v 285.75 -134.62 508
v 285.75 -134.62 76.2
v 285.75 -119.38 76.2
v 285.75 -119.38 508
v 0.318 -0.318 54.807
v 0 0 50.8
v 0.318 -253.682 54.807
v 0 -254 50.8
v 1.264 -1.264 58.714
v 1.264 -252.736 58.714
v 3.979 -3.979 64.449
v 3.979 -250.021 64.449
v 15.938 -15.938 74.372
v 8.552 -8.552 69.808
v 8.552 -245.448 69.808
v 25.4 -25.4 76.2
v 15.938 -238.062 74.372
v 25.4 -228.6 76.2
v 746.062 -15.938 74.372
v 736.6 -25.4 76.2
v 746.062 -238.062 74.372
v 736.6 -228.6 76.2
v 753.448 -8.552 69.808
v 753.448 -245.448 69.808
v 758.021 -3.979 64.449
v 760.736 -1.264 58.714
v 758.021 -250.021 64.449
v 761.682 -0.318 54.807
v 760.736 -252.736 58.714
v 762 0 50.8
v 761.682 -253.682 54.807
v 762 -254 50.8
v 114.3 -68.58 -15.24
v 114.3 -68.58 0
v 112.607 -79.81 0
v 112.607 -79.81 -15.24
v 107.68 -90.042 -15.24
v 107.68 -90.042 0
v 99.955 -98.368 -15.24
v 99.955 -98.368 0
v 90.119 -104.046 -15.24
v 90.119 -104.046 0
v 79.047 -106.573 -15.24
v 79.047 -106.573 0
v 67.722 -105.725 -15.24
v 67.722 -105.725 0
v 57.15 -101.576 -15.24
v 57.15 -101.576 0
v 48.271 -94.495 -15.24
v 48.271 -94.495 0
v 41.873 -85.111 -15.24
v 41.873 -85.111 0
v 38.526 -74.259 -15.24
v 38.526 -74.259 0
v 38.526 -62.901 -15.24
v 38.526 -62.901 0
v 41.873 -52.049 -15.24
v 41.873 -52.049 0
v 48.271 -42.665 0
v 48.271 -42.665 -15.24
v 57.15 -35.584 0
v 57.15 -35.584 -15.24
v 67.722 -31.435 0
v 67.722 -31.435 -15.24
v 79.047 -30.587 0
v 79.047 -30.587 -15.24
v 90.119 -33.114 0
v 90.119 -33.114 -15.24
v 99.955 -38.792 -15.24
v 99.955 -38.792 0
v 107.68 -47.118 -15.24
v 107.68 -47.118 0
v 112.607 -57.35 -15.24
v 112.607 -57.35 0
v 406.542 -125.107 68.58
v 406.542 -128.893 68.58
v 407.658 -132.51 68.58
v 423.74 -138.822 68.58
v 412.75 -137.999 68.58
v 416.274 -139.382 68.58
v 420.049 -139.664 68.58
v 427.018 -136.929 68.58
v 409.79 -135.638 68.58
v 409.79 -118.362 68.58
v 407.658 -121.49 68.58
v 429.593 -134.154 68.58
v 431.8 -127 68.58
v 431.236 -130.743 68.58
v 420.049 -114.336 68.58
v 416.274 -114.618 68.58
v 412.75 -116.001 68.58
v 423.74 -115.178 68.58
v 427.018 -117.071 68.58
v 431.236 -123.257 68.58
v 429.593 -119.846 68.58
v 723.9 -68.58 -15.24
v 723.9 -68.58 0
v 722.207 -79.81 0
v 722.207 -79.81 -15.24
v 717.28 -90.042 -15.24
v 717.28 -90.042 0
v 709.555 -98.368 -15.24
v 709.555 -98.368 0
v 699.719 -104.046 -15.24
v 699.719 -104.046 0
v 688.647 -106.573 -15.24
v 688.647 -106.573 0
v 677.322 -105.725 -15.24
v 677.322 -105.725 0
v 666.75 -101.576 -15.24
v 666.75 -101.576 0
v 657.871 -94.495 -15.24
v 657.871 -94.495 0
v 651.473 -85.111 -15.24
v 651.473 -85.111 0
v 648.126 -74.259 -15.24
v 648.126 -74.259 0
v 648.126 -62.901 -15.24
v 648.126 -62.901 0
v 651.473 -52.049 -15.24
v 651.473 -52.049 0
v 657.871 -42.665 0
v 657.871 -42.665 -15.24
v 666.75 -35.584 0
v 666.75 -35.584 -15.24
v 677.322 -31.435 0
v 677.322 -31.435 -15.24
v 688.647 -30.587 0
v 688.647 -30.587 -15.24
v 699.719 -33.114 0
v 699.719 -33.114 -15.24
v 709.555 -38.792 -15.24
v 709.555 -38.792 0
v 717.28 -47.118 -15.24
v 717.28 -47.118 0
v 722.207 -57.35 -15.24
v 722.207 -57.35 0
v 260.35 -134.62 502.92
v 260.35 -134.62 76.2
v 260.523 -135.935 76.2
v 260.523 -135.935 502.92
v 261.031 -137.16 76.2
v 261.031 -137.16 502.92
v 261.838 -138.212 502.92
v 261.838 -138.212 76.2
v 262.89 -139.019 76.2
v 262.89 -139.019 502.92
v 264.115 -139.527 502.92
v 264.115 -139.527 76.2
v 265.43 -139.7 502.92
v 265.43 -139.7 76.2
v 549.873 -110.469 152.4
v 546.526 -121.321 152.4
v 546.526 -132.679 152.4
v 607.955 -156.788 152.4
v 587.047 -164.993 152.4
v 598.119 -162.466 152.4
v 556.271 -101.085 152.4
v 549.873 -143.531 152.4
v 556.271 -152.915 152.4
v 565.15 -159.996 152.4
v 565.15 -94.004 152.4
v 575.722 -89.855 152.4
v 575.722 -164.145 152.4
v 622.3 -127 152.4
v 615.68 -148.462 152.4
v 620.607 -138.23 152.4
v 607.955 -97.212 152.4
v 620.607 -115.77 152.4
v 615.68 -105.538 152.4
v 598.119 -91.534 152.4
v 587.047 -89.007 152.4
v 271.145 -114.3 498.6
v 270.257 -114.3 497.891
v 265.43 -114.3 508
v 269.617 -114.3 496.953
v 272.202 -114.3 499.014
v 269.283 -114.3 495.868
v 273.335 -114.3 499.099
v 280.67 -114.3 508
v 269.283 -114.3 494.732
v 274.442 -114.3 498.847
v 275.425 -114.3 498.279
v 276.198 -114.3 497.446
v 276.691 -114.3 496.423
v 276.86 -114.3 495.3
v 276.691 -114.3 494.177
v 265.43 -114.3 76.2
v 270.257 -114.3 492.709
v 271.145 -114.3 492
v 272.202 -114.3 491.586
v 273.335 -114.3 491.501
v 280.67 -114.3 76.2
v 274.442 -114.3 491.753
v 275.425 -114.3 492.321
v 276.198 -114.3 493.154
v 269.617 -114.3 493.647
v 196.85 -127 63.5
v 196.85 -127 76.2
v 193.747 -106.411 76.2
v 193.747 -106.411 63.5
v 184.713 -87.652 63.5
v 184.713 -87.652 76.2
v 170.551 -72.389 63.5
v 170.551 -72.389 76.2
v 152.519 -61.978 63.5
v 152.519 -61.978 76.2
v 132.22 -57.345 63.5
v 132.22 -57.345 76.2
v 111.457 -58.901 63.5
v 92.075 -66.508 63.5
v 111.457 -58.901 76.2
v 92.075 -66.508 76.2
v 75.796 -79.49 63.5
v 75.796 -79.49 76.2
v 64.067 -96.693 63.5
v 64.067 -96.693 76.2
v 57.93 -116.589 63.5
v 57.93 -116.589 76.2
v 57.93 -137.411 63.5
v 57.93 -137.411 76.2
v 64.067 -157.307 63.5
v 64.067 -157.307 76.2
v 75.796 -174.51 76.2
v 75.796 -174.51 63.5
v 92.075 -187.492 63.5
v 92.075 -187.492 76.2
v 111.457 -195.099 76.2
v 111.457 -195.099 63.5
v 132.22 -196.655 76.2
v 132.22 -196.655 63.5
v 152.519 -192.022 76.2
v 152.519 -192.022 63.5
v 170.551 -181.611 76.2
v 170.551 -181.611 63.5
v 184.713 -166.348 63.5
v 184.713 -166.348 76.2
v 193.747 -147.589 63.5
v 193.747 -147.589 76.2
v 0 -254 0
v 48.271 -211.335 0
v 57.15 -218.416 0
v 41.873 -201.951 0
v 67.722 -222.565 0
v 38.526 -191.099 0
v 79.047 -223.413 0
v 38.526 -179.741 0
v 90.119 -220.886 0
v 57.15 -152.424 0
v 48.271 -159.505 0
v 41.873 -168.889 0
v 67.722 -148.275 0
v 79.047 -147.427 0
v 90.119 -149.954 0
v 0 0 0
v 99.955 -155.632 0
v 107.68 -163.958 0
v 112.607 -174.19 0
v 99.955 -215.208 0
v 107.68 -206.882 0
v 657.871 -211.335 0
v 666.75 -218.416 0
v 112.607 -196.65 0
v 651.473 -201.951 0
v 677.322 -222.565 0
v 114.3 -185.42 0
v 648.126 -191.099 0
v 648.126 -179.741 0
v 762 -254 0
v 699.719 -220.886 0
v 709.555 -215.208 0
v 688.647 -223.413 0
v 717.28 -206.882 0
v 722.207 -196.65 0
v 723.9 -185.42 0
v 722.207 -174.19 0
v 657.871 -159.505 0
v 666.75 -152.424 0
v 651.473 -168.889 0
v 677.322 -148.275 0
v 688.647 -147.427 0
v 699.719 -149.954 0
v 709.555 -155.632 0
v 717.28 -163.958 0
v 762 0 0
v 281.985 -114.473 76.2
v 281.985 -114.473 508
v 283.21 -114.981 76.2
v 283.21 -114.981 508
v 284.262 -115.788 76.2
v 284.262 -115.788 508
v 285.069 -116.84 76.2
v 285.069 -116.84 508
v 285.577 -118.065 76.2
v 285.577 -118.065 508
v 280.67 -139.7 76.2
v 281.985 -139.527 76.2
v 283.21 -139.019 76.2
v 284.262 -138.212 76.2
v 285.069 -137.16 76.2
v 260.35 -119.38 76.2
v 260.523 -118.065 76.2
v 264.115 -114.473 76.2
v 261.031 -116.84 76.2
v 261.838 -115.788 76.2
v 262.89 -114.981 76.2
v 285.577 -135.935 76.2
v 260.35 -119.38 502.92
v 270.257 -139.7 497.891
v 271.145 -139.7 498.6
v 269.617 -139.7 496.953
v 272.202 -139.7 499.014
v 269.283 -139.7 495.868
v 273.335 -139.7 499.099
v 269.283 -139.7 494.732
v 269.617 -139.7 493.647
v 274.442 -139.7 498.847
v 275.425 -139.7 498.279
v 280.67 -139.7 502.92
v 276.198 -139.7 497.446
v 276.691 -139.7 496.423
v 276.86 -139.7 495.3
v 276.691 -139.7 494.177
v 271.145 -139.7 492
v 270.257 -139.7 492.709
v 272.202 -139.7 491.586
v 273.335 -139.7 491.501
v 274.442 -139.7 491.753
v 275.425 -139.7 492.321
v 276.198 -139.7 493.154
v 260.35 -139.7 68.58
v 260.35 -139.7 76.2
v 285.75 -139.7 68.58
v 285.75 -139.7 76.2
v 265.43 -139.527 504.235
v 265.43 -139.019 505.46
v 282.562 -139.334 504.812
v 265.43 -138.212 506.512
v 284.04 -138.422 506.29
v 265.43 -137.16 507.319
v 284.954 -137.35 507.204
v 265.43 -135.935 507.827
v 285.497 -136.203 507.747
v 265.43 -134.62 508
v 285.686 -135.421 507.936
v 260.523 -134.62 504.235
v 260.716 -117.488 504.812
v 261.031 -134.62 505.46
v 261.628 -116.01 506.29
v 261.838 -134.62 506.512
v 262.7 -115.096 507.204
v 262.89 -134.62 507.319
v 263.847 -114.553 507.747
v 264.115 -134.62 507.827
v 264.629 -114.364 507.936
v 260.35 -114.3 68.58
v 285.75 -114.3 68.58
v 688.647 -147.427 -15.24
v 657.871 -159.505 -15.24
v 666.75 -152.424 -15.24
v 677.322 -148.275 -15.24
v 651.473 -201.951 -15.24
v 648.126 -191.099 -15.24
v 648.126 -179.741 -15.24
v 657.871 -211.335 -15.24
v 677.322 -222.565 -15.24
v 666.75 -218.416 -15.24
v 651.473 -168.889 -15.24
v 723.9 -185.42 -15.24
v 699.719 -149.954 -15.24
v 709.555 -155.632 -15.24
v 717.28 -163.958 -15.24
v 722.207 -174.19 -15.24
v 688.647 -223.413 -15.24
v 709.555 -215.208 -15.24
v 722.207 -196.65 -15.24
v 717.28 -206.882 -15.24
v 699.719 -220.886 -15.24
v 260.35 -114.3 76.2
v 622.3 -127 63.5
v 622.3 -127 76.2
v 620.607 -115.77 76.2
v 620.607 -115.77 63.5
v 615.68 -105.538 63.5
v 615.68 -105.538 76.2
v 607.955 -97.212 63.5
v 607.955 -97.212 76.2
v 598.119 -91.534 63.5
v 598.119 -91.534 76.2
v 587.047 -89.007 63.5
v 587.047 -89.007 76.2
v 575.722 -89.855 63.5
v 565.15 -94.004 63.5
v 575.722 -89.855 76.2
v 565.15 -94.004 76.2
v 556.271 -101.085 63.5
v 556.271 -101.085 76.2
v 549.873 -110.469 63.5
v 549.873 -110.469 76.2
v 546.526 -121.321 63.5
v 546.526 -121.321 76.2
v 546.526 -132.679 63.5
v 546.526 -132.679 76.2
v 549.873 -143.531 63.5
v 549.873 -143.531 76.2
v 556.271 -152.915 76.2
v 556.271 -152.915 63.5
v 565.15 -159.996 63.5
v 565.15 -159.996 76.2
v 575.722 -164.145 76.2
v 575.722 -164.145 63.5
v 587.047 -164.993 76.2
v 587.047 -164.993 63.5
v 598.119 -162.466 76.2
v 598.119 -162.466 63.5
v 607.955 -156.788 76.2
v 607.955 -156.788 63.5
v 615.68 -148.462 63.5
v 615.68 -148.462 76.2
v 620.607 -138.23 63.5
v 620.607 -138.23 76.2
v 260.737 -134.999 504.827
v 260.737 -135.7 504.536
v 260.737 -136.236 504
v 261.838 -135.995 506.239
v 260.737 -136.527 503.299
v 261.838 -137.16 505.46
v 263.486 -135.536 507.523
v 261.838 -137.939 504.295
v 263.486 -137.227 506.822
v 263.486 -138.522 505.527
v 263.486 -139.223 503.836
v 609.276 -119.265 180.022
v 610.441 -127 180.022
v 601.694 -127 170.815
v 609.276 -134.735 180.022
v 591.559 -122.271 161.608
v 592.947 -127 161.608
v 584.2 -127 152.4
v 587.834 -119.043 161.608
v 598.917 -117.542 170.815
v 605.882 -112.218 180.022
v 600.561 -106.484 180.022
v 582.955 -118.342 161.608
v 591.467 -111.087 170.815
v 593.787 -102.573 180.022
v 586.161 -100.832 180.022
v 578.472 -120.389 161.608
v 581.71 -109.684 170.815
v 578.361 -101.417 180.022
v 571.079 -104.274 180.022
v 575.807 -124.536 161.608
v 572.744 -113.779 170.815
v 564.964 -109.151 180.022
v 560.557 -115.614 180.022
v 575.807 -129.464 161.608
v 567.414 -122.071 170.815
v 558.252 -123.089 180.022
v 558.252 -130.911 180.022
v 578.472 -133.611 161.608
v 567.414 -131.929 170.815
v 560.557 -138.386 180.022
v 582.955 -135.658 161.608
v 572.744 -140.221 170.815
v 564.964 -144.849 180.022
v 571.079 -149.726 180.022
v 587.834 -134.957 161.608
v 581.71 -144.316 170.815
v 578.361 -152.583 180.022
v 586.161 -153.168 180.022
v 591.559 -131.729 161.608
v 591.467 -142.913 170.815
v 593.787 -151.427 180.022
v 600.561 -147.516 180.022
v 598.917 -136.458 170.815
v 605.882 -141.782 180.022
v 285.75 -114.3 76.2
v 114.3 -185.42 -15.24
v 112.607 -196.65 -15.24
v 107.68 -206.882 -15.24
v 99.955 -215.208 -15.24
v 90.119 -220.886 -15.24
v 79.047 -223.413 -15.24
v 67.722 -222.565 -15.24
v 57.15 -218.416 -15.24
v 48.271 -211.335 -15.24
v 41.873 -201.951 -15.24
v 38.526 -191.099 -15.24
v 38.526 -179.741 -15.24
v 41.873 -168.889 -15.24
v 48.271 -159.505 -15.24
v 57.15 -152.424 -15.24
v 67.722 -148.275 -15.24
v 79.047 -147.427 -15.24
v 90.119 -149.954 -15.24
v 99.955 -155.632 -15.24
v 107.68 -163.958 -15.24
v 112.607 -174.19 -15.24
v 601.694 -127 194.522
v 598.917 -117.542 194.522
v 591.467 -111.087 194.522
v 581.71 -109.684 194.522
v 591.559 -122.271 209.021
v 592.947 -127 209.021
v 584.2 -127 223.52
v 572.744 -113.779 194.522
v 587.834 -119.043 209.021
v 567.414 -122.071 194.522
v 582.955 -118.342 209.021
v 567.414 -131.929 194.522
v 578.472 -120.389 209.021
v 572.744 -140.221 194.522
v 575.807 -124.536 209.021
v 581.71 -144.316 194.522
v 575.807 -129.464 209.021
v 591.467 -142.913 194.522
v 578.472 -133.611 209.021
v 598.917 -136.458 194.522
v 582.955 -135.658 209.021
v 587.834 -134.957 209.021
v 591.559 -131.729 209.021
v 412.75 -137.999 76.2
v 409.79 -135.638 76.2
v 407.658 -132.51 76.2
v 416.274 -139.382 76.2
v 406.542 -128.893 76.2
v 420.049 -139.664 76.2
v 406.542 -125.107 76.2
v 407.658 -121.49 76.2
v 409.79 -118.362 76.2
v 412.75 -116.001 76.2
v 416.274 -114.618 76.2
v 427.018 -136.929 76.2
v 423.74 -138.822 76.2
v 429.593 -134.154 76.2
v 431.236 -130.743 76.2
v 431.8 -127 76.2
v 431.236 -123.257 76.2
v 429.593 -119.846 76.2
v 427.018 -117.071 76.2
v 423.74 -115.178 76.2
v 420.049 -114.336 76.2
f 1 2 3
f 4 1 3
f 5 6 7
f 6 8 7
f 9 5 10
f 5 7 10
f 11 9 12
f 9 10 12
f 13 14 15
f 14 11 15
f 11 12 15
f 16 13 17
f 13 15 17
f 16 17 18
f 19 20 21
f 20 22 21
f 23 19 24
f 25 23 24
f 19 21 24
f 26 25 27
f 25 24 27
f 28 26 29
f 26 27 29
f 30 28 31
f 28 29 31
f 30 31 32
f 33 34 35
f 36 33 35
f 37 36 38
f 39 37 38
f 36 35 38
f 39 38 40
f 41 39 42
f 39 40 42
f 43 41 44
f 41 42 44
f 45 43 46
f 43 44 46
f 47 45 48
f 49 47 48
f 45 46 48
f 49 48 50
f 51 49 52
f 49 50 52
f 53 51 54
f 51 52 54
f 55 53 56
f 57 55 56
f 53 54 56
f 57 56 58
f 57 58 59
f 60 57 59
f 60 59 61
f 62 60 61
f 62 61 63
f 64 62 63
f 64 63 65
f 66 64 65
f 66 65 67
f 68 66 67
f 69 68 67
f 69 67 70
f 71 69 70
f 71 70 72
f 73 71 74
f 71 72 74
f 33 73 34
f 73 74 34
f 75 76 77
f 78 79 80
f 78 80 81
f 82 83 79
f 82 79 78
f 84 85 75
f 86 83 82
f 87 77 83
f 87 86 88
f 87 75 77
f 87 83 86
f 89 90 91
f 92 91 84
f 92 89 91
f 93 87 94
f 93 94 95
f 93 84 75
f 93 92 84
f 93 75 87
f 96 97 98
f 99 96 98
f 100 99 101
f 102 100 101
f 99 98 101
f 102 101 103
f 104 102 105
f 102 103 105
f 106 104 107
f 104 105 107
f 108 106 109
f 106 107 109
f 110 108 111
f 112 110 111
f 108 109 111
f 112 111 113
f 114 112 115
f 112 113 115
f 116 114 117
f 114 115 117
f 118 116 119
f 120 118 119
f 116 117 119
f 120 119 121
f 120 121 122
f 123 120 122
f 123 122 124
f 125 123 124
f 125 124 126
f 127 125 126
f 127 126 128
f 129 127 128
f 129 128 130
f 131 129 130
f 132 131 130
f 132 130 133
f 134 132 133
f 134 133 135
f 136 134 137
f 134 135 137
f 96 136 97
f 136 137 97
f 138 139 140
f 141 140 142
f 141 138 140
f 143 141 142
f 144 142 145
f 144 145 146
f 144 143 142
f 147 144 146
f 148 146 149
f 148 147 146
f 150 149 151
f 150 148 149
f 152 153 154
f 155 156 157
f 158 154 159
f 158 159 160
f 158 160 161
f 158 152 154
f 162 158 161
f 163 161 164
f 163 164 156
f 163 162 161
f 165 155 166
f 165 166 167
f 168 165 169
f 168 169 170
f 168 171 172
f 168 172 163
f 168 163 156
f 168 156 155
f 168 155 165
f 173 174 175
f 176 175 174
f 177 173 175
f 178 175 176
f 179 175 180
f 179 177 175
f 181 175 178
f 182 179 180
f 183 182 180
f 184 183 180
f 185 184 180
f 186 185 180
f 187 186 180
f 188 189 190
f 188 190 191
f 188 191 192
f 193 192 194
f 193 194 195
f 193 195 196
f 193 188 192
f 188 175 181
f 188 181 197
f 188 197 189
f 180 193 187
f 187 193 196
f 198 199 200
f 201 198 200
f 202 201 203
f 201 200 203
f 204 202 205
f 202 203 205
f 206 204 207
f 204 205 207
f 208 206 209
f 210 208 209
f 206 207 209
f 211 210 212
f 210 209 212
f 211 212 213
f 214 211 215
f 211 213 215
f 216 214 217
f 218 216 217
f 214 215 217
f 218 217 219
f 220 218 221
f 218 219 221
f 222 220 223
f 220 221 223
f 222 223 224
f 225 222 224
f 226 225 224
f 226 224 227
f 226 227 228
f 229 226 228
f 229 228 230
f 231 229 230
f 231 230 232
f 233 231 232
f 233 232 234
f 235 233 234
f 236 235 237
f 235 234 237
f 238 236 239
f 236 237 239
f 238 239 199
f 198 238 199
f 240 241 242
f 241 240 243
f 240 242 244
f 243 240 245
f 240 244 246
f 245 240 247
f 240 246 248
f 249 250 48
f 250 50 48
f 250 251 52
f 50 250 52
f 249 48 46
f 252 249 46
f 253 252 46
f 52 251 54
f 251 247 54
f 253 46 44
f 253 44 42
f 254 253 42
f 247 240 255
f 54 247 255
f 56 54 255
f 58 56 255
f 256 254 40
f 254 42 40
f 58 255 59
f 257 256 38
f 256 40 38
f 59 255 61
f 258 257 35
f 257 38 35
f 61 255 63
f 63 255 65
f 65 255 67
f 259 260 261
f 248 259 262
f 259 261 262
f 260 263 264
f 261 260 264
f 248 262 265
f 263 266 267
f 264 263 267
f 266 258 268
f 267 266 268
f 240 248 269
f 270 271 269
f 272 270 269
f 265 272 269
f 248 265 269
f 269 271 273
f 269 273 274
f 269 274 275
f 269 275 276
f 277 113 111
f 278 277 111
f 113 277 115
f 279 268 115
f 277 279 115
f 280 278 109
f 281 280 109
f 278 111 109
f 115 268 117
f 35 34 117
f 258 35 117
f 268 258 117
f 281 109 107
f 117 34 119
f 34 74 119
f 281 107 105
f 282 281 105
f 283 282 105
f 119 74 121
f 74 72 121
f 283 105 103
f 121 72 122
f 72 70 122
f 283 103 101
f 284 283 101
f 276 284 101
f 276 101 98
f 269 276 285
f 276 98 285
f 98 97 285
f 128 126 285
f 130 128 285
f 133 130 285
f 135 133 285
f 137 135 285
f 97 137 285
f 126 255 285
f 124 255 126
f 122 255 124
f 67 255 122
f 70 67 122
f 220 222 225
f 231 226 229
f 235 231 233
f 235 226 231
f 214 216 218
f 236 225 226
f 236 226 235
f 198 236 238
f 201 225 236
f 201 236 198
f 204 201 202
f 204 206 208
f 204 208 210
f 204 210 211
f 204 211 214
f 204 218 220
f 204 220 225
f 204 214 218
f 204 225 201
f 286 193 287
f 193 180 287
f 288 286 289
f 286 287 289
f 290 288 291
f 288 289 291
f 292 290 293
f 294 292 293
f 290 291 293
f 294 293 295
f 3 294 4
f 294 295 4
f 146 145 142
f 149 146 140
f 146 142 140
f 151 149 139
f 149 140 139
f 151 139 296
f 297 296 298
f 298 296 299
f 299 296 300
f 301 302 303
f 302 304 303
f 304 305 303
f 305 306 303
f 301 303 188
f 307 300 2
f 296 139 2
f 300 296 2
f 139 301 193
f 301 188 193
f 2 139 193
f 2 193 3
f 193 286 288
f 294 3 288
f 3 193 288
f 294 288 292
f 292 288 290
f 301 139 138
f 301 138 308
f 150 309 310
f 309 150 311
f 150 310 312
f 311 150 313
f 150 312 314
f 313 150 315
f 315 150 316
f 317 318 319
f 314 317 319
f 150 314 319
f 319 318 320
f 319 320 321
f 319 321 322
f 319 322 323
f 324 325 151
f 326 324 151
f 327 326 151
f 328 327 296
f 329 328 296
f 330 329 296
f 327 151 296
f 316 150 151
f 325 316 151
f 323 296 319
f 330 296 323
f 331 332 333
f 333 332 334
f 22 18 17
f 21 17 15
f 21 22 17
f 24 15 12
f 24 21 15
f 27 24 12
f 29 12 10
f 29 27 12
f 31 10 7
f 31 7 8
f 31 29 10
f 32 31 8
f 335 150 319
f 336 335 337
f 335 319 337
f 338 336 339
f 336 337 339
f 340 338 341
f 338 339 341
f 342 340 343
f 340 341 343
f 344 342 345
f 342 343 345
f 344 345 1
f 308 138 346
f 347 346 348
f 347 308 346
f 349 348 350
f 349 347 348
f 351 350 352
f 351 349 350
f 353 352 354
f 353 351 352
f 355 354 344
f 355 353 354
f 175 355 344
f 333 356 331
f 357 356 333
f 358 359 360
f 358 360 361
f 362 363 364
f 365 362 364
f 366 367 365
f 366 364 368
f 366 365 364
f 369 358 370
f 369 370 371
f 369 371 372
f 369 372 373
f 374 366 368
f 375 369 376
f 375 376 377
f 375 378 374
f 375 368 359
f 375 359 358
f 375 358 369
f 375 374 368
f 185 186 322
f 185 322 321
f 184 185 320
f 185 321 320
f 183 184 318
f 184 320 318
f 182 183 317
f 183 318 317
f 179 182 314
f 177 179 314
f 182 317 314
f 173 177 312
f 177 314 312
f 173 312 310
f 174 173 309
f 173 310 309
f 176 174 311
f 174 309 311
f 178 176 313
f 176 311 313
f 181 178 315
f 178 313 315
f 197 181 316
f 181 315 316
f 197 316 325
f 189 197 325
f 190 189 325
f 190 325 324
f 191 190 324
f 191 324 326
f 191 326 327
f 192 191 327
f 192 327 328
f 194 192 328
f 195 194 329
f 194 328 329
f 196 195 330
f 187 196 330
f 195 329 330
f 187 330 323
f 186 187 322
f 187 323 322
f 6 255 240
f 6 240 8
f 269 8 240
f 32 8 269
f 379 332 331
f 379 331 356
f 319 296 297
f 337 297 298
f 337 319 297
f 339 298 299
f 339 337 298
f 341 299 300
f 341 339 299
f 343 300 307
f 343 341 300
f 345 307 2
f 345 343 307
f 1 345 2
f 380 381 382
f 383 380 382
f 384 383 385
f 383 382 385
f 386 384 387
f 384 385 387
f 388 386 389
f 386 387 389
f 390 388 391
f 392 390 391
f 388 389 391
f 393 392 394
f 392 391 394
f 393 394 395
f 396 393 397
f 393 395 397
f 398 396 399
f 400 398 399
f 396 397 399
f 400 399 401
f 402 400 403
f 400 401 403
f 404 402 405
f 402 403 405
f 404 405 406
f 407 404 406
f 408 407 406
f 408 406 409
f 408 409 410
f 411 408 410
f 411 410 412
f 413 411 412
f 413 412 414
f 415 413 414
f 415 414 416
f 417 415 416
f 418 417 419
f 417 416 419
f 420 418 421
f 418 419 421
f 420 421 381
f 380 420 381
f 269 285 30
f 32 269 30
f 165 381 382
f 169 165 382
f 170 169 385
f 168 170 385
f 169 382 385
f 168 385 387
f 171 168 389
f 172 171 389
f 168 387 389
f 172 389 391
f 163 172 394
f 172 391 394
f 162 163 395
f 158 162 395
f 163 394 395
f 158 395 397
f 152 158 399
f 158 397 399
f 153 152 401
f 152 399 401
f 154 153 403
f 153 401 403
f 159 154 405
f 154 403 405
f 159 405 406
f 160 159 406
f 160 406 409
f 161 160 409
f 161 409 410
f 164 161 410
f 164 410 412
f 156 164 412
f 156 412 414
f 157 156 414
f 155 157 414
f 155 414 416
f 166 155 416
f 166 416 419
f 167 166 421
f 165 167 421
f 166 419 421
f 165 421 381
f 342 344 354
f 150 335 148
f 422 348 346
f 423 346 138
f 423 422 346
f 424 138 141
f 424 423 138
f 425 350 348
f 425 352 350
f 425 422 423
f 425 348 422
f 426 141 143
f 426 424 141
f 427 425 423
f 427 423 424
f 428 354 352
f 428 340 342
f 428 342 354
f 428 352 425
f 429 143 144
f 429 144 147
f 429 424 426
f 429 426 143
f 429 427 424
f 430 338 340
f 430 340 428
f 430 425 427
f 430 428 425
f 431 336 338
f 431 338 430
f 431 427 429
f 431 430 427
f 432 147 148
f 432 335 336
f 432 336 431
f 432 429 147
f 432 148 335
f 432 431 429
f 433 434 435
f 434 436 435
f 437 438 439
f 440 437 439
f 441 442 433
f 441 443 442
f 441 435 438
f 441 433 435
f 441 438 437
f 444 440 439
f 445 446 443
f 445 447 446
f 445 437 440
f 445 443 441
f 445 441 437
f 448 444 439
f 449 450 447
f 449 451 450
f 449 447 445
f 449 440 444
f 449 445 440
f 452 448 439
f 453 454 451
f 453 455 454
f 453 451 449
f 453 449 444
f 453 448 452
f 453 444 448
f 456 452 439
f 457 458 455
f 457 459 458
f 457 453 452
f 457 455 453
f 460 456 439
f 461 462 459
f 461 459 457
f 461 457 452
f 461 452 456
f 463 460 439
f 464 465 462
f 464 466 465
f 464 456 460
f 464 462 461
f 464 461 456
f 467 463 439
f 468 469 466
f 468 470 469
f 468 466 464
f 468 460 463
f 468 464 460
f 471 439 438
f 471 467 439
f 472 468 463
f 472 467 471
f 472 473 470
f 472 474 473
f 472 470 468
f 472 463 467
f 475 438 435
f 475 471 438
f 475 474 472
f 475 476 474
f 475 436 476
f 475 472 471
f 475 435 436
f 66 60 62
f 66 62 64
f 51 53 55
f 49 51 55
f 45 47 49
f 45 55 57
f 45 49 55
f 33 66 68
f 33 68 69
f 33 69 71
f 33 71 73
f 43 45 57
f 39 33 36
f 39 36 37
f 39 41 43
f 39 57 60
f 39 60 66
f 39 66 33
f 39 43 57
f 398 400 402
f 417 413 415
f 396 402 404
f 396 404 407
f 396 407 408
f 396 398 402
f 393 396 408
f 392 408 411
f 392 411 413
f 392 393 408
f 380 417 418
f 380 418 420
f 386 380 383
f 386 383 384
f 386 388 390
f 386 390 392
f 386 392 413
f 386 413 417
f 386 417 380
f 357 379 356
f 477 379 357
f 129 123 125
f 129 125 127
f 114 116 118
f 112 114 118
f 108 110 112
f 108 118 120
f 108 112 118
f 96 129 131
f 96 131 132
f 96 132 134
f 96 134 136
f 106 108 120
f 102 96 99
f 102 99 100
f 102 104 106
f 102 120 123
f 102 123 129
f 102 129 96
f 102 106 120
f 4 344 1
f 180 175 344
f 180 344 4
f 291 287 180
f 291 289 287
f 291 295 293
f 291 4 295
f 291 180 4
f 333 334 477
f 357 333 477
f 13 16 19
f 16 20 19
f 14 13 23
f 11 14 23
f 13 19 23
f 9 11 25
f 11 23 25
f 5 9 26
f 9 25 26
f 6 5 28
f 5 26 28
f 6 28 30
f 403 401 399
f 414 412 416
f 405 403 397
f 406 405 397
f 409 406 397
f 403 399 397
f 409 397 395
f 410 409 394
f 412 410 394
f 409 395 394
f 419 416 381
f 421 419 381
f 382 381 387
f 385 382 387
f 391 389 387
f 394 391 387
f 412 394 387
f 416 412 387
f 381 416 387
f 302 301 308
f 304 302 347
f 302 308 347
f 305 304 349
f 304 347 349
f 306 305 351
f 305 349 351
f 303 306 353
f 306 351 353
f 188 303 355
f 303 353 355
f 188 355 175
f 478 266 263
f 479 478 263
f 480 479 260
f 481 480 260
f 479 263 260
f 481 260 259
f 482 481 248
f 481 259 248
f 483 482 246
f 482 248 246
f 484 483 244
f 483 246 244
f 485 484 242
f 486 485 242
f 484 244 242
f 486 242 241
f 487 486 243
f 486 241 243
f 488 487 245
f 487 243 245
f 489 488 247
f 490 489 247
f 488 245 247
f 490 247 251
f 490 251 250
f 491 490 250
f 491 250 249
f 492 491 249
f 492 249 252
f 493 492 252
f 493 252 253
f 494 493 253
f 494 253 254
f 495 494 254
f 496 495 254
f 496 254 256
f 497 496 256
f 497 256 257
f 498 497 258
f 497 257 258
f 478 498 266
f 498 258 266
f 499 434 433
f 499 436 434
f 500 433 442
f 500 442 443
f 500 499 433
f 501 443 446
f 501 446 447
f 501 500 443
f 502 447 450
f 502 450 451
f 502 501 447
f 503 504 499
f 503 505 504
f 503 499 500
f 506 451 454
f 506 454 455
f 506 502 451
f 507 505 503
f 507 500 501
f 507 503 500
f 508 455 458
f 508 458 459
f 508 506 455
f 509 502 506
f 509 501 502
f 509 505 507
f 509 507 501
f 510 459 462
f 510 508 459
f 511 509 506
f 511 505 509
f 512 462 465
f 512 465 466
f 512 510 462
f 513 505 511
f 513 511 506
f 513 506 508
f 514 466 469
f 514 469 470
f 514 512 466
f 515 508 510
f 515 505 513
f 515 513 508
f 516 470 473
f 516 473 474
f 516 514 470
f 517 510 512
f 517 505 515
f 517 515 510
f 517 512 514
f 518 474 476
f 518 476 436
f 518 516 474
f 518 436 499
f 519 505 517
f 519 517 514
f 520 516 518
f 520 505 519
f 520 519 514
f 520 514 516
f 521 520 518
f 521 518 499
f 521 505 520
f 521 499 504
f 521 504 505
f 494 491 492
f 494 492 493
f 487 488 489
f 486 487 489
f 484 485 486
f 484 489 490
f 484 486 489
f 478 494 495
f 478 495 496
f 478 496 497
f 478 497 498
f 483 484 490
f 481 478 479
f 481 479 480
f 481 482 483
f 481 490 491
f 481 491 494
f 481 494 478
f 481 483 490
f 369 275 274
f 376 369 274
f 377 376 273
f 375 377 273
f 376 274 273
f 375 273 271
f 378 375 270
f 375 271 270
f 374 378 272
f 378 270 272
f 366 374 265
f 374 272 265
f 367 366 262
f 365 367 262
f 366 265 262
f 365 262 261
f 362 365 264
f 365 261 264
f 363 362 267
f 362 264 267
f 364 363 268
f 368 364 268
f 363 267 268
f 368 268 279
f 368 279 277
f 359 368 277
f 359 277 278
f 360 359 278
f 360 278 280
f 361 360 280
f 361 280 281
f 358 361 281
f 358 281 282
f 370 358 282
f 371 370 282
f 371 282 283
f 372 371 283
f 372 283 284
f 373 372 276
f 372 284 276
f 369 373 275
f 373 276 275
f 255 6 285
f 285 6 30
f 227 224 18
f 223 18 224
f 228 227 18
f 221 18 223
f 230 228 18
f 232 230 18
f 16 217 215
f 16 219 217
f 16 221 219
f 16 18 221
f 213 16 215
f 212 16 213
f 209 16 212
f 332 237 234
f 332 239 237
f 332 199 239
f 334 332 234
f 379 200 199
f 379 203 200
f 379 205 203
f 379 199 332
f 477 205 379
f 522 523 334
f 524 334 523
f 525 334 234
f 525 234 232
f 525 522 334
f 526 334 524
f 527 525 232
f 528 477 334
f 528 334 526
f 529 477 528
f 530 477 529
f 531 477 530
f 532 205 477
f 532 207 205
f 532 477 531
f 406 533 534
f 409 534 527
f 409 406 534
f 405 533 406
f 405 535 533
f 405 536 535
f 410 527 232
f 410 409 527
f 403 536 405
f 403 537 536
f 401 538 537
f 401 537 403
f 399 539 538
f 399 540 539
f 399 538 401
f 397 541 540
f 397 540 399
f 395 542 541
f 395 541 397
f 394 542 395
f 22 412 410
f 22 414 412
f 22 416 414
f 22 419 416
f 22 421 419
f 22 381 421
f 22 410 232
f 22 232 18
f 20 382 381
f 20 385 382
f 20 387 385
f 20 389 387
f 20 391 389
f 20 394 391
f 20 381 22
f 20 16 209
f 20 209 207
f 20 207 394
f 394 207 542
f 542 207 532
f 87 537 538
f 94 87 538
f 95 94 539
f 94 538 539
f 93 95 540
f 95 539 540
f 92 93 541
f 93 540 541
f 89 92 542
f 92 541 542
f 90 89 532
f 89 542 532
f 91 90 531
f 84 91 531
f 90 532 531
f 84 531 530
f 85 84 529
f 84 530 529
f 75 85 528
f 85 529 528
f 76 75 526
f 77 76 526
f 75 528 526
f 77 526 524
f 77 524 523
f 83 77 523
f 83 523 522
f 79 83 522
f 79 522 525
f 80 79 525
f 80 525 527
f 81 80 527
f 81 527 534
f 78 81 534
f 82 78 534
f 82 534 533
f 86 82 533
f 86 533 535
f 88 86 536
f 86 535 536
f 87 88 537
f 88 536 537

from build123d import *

# Parameters (mm, degrees)
F0_W      = 762
F0_H      = 76.2
F1_DEPTH  = 254
F4_R      = 38.1
F5_DEPTH  = 15.24
F2_R      = 38.1
F6_DEPTH  = 76.2
F3_R      = 69.85
F7_DEPTH  = 12.7
F8_DEPTH  = 12.7
F9_R      = 12.7
F10_DEPTH = 7.62
F15_W     = 25.4
F15_H     = 25.4
F16_DEPTH = 7.62
F17_DEPTH = 431.8
F18_R     = 3.81
F19_DEPTH = 12.7
F20_R     = 25.4
F21_R     = 5.08


with BuildPart() as f1:
    # F0 (on Front) → F1 (new body)
    with BuildSketch(Plane.XZ):
        with Locations((381, 38.1)):
            Rectangle(F0_W, F0_H)
    extrude(amount=F1_DEPTH)

    # F4 (on face) → F5 (join)
    with BuildSketch(Plane(origin=(0, 0, 0), x_dir=(1, 0, 0), z_dir=(0, 0, -1))):
        with Locations((76.2, 185.42)):
            Circle(F4_R)
        with Locations((685.8, 185.42)):
            Circle(F4_R)
        with Locations((685.8, 68.58)):
            Circle(F4_R)
        with Locations((76.2, 68.58)):
            Circle(F4_R)
    extrude(amount=F5_DEPTH)

    # F3 (on face) → F7 (cut)
    with BuildSketch(Plane.XY.offset(76.2)):
        with Locations((127, -127)):
            Circle(F3_R)
    extrude(amount=-F7_DEPTH, mode=Mode.SUBTRACT)

    # F2 (on face) → F8 (cut)
    with BuildSketch(Plane.XY.offset(76.2)):
        with Locations((584.2, -127)):
            Circle(F2_R)
    extrude(amount=-F8_DEPTH, mode=Mode.SUBTRACT)

    # F9 (on face) → F10 (cut)
    with BuildSketch(Plane.XY.offset(76.2)):
        with Locations((419.1, -127)):
            Circle(F9_R)
    extrude(amount=-F10_DEPTH, mode=Mode.SUBTRACT)

    # F15 (on face) → F16 (cut)
    with BuildSketch(Plane.XY.offset(76.2)):
        with Locations((273.05, -127)):
            Rectangle(F15_W, F15_H)
    extrude(amount=-F16_DEPTH, mode=Mode.SUBTRACT)

    # F20
    f20_edges = [f1.edges().sort_by_distance(p)[0] for p in [
        (381, -254, 76.2),
        (762, -127, 76.2),
        (381, 0, 76.2),
        (0, -127, 76.2),
    ]]
    fillet(f20_edges, radius=F20_R)


with BuildPart() as f6:
    # F2 (on face) → F6 (new body)
    with BuildSketch(Plane.XY.offset(76.2)):
        with Locations((584.2, -127)):
            Circle(F2_R)
    extrude(amount=F6_DEPTH)


with BuildPart() as f14:
    # F13 (on plane+point) → F14 (revolve)
    with BuildSketch(Plane.XZ.offset(127)):
        Polygon((584.2, 223.52), (584.2, 152.4), (610.4413317831, 180.0225), align=None)
    revolve(axis=Axis((584.2, -127, 187.96), (0, 0, 1)))


with BuildPart() as f17:
    # F15 (on face) → F17 (new body)
    with BuildSketch(Plane.XY.offset(76.2)):
        with Locations((273.05, -127)):
            Rectangle(F15_W, F15_H)
    extrude(amount=F17_DEPTH)

    # F18 (on plane+point) → F19 (cut, symmetric)
    with BuildSketch(Plane.XZ.offset(127)):
        with Locations((273.05, 495.3)):
            Circle(F18_R)
    extrude(amount=F19_DEPTH, both=True, mode=Mode.SUBTRACT)

    # F21
    f21_edges = [f17.edges().sort_by_distance(p)[0] for p in [
        (285.75, -139.7, 292.1),
        (273.05, -139.7, 508),
        (285.75, -114.3, 292.1),
        (260.35, -127, 508),
        (260.35, -139.7, 292.1),
        (260.35, -114.3, 292.1),
    ]]
    fillet(f21_edges, radius=F21_R)


solid = Compound([f1.part, f6.part, f14.part, f17.part])
